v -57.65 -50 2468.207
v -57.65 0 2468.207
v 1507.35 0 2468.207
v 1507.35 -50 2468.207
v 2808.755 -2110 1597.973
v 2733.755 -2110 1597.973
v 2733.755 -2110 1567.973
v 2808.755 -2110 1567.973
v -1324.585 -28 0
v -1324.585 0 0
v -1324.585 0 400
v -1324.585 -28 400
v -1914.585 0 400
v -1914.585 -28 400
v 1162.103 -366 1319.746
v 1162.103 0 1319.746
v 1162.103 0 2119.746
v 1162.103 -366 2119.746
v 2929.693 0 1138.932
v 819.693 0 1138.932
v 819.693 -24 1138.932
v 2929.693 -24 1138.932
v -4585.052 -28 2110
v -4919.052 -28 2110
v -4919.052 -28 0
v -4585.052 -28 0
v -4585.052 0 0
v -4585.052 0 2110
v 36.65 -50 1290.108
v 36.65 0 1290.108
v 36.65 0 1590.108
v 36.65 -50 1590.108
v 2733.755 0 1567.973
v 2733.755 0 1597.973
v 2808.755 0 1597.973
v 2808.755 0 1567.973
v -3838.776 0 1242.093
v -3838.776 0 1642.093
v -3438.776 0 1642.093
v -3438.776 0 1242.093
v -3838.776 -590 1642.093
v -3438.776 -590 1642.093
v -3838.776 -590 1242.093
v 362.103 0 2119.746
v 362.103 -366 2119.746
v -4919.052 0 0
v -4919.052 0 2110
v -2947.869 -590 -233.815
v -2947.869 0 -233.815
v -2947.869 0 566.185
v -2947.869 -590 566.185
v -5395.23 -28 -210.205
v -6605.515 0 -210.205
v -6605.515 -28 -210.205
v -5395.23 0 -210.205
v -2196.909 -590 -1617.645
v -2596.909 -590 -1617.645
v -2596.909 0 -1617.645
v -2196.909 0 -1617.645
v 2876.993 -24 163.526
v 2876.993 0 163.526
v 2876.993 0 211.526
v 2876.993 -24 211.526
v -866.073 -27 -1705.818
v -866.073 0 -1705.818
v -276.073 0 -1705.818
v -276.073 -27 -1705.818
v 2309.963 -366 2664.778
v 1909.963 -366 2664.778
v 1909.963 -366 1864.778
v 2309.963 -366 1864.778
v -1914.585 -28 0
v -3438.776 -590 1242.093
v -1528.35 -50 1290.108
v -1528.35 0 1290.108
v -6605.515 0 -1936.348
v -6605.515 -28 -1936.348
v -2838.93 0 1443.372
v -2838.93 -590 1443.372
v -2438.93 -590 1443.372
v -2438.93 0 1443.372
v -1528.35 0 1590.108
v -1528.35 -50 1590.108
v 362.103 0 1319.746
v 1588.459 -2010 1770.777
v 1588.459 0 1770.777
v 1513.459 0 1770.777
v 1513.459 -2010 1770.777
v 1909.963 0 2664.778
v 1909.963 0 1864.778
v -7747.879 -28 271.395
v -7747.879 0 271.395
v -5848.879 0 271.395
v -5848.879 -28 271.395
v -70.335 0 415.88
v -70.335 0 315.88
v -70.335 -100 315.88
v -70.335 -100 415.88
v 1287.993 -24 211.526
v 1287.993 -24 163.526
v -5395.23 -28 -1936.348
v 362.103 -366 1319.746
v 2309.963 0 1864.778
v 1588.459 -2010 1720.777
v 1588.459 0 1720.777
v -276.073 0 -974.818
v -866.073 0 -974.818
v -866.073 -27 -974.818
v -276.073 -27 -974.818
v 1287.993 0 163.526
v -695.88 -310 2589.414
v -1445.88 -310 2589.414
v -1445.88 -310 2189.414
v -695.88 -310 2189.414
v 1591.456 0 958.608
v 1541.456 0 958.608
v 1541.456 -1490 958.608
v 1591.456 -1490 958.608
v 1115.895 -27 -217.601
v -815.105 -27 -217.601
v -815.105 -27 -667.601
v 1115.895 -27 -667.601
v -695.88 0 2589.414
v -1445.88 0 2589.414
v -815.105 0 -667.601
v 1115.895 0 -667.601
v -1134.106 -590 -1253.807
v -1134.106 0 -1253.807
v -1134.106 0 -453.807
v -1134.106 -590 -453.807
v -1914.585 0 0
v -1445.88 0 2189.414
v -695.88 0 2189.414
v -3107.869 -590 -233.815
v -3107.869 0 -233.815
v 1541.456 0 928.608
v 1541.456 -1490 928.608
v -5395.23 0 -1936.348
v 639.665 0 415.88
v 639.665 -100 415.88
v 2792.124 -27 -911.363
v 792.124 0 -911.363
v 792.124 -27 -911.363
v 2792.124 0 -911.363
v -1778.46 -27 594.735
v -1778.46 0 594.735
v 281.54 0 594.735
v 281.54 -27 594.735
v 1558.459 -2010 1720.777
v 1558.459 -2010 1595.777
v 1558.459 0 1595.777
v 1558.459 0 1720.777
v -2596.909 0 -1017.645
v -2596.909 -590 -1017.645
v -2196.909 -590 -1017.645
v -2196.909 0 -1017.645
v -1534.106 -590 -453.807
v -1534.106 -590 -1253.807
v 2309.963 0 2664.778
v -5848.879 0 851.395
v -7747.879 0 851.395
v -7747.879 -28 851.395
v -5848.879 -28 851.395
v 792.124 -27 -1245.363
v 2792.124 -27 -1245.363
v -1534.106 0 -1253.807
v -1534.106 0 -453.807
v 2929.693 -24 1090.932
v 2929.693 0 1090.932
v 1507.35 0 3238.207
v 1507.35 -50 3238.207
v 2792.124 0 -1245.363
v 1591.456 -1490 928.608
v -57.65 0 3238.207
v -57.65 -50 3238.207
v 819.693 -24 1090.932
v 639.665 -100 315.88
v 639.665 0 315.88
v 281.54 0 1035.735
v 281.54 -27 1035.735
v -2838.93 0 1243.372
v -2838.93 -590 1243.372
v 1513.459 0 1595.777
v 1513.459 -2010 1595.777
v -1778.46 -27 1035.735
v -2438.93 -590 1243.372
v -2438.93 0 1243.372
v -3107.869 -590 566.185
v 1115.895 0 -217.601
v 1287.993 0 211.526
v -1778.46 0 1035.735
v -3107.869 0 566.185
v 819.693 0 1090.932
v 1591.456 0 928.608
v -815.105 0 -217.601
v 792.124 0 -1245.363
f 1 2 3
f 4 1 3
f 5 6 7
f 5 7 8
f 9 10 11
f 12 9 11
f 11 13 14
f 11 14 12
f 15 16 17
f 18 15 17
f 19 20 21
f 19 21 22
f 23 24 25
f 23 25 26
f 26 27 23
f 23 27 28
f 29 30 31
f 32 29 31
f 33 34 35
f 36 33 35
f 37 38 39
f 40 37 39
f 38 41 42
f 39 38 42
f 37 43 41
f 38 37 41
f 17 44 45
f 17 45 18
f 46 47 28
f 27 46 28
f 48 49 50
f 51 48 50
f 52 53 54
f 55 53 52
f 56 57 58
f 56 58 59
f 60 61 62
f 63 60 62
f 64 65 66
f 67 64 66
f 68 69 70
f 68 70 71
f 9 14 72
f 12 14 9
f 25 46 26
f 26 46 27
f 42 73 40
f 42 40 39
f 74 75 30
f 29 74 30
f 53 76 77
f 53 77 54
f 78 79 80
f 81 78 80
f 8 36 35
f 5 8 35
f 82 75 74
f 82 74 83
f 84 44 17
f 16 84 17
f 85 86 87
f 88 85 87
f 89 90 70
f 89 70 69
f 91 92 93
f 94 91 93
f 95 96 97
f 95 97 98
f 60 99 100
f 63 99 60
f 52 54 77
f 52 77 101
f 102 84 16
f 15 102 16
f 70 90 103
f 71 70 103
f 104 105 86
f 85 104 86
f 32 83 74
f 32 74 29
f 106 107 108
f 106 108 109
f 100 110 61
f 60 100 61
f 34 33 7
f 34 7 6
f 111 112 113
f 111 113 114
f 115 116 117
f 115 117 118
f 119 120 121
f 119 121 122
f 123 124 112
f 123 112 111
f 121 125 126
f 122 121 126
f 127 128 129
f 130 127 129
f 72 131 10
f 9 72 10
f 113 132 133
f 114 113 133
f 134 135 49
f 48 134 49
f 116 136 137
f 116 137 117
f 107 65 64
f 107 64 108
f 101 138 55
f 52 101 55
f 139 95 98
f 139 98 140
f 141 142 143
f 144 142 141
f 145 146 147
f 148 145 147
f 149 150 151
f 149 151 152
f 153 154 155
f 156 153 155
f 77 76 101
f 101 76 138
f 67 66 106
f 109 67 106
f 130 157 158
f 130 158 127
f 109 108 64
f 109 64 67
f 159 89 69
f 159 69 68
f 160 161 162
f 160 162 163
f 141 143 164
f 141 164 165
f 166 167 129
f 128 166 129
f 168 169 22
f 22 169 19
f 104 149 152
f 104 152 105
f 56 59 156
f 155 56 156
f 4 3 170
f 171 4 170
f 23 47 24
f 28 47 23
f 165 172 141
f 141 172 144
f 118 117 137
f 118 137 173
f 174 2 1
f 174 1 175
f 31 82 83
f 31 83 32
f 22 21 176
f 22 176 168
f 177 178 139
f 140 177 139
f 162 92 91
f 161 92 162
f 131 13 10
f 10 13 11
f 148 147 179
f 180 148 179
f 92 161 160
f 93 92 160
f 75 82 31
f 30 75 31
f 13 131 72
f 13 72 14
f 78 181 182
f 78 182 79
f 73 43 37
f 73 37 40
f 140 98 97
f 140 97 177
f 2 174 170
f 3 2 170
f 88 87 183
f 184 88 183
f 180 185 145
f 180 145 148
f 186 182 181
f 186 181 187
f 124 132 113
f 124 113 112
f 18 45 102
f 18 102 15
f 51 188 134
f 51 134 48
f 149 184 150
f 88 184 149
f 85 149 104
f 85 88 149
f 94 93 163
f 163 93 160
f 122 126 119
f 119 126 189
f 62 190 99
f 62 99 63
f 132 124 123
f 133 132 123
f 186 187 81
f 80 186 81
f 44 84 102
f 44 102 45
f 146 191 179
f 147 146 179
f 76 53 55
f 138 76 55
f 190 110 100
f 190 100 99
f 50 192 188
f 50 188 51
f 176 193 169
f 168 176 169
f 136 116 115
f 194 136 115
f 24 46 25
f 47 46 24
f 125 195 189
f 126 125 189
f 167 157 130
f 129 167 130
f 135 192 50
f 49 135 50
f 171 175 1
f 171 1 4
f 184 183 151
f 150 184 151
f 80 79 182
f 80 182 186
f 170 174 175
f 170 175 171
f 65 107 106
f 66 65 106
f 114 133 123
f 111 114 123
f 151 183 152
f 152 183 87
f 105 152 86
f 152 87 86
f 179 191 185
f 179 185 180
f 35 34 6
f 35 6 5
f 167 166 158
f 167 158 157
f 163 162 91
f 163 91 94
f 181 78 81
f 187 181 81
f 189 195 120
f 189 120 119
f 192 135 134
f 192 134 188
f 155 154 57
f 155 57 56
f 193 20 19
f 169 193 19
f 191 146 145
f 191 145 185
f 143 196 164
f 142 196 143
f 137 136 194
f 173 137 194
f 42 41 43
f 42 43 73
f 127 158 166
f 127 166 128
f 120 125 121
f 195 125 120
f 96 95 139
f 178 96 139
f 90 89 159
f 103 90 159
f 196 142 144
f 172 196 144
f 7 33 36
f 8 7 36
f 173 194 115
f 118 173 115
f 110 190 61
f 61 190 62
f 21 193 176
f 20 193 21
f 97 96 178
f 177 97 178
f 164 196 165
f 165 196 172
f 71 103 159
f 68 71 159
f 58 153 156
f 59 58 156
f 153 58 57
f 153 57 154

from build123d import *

# Parameters (mm, degrees)
F0_W      = 710
F0_H      = 100
F1_DEPTH  = 100
F2_W      = 2000
F2_H      = 334
F3_DEPTH  = 27
F4_W      = 1565
F4_H      = 770
F4_H_2    = 300
F5_DEPTH  = 50
F7_DEPTH  = 2010
F8_W      = 2110
F8_H      = 48
F9_DEPTH  = 24
F10_W     = 1589
F10_H     = 48
F11_DEPTH = 24
F12_W     = 1899
F12_H     = 580
F12_W_2   = 334
F12_H_2   = 2110
F12_W_3   = 1210.284843
F12_H_3   = 1726.143237
F13_DEPTH = 28
F14_W     = 800
F14_H     = 800
F15_DEPTH = 366
F16_W     = 400
F16_H     = 800
F17_DEPTH = 366
F18_W     = 750
F18_H     = 400
F19_DEPTH = 310
F20_W     = 75
F20_H     = 30
F21_DEPTH = 2110
F22_W     = 400
F22_H     = 200
F22_H_2   = 400
F23_DEPTH = 590
F24_W     = 400
F24_H     = 600
F25_DEPTH = 590
F26_W     = 590
F26_H     = 400
F27_DEPTH = 28
F28_W     = 160
F28_H     = 800
F29_DEPTH = 590
F30_W     = 400
F30_H     = 800
F31_DEPTH = 590
F32_W     = 2060
F32_H     = 441
F32_W_2   = 1931
F32_H_2   = 450
F32_W_3   = 590
F32_H_3   = 731
F33_DEPTH = 27
F34_W     = 50
F34_H     = 30
F35_DEPTH = 1490


with BuildPart() as f1:
    # F0 (on Front) → F1 (new body)
    with BuildSketch(Plane.XZ):
        with Locations((284.664744, 365.880244)):
            Rectangle(F0_W, F0_H)
    extrude(amount=F1_DEPTH)


with BuildPart() as f3:
    # F2 (on Front) → F3 (new body)
    with BuildSketch(Plane.XZ):
        with Locations((1792.124271, -1078.362907)):
            Rectangle(F2_W, F2_H)
    extrude(amount=F3_DEPTH)


with BuildPart() as f5:
    # F4 (on Front) → F5 (new body)
    with BuildSketch(Plane.XZ):
        with Locations((724.849694, 2853.207262)):
            Rectangle(F4_W, F4_H)
        with Locations((-745.849795, 1440.107686)):
            Rectangle(F4_W, F4_H_2)
    extrude(amount=F5_DEPTH)


with BuildPart() as f7:
    # F6 (on Front) → F7 (new body)
    with BuildSketch(Plane.XZ):
        Polygon((1513.458872, 1595.77716), (1558.458872, 1595.77716), (1558.458872, 1720.77716), (1588.458872, 1720.77716), (1588.458872, 1770.77716), (1513.458872, 1770.77716), align=None)
    extrude(amount=F7_DEPTH)


with BuildPart() as f9:
    # F8 (on Front) → F9 (new body)
    with BuildSketch(Plane.XZ):
        with Locations((1874.693036, 1114.932496)):
            Rectangle(F8_W, F8_H)
    extrude(amount=F9_DEPTH)


with BuildPart() as f11:
    # F10 (on Front) → F11 (new body)
    with BuildSketch(Plane.XZ):
        with Locations((2082.493305, 187.526129)):
            Rectangle(F10_W, F10_H)
    extrude(amount=F11_DEPTH)


with BuildPart() as f13:
    # F12 (on Front) → F13 (new body)
    with BuildSketch(Plane.XZ):
        with Locations((-6798.378944, 561.394877)):
            Rectangle(F12_W, F12_H)
        with Locations((-4752.052484, 1055)):
            Rectangle(F12_W_2, F12_H_2)
        with Locations((-6000.372431, -1073.276282)):
            Rectangle(F12_W_3, F12_H_3)
    extrude(amount=F13_DEPTH)


with BuildPart() as f15:
    # F14 (on Front) → F15 (new body)
    with BuildSketch(Plane.XZ):
        with Locations((762.103327, 1719.746114)):
            Rectangle(F14_W, F14_H)
    extrude(amount=F15_DEPTH)


with BuildPart() as f17:
    # F16 (on Front) → F17 (new body)
    with BuildSketch(Plane.XZ):
        with Locations((2109.963225, 2264.778495)):
            Rectangle(F16_W, F16_H)
    extrude(amount=F17_DEPTH)


with BuildPart() as f19:
    # F18 (on Front) → F19 (new body)
    with BuildSketch(Plane.XZ):
        with Locations((-1070.879757, 2389.413956)):
            Rectangle(F18_W, F18_H)
    extrude(amount=F19_DEPTH)


with BuildPart() as f21:
    # F20 (on Front) → F21 (new body)
    with BuildSketch(Plane.XZ):
        with Locations((2771.255136, 1582.972825)):
            Rectangle(F20_W, F20_H)
    extrude(amount=F21_DEPTH)


with BuildPart() as f23:
    # F22 (on Front) → F23 (new body)
    with BuildSketch(Plane.XZ):
        with Locations((-2638.930207, 1343.371749)):
            Rectangle(F22_W, F22_H)
        with Locations((-3638.775873, 1442.092967)):
            Rectangle(F22_W, F22_H_2)
    extrude(amount=F23_DEPTH)


with BuildPart() as f25:
    # F24 (on Front) → F25 (new body)
    with BuildSketch(Plane.XZ):
        with Locations((-2396.908727, -1317.645407)):
            Rectangle(F24_W, F24_H)
    extrude(amount=F25_DEPTH)


with BuildPart() as f27:
    # F26 (on Front) → F27 (new body)
    with BuildSketch(Plane.XZ):
        with Locations((-1619.585202, 200)):
            Rectangle(F26_W, F26_H)
    extrude(amount=F27_DEPTH)


with BuildPart() as f29:
    # F28 (on Front) → F29 (new body)
    with BuildSketch(Plane.XZ):
        with Locations((-3027.869124, 166.185106)):
            Rectangle(F28_W, F28_H)
    extrude(amount=F29_DEPTH)


with BuildPart() as f31:
    # F30 (on Front) → F31 (new body)
    with BuildSketch(Plane.XZ):
        with Locations((-1334.106386, -853.806677)):
            Rectangle(F30_W, F30_H)
    extrude(amount=F31_DEPTH)


with BuildPart() as f33:
    # F32 (on Front) → F33 (new body)
    with BuildSketch(Plane.XZ):
        with Locations((-748.460316, 815.234985)):
            Rectangle(F32_W, F32_H)
        with Locations((150.395396, -442.6007)):
            Rectangle(F32_W_2, F32_H_2)
        with Locations((-571.072953, -1340.318295)):
            Rectangle(F32_W_3, F32_H_3)
    extrude(amount=F33_DEPTH)


with BuildPart() as f35:
    # F34 (on Front) → F35 (new body)
    with BuildSketch(Plane.XZ):
        with Locations((1566.456125, 943.608493)):
            Rectangle(F34_W, F34_H)
    extrude(amount=F35_DEPTH)


solid = Compound([f1.part, f3.part, f5.part, f7.part, f9.part, f11.part, f13.part, f15.part, f17.part, f19.part, f21.part, f23.part, f25.part, f27.part, f29.part, f31.part, f33.part, f35.part])
